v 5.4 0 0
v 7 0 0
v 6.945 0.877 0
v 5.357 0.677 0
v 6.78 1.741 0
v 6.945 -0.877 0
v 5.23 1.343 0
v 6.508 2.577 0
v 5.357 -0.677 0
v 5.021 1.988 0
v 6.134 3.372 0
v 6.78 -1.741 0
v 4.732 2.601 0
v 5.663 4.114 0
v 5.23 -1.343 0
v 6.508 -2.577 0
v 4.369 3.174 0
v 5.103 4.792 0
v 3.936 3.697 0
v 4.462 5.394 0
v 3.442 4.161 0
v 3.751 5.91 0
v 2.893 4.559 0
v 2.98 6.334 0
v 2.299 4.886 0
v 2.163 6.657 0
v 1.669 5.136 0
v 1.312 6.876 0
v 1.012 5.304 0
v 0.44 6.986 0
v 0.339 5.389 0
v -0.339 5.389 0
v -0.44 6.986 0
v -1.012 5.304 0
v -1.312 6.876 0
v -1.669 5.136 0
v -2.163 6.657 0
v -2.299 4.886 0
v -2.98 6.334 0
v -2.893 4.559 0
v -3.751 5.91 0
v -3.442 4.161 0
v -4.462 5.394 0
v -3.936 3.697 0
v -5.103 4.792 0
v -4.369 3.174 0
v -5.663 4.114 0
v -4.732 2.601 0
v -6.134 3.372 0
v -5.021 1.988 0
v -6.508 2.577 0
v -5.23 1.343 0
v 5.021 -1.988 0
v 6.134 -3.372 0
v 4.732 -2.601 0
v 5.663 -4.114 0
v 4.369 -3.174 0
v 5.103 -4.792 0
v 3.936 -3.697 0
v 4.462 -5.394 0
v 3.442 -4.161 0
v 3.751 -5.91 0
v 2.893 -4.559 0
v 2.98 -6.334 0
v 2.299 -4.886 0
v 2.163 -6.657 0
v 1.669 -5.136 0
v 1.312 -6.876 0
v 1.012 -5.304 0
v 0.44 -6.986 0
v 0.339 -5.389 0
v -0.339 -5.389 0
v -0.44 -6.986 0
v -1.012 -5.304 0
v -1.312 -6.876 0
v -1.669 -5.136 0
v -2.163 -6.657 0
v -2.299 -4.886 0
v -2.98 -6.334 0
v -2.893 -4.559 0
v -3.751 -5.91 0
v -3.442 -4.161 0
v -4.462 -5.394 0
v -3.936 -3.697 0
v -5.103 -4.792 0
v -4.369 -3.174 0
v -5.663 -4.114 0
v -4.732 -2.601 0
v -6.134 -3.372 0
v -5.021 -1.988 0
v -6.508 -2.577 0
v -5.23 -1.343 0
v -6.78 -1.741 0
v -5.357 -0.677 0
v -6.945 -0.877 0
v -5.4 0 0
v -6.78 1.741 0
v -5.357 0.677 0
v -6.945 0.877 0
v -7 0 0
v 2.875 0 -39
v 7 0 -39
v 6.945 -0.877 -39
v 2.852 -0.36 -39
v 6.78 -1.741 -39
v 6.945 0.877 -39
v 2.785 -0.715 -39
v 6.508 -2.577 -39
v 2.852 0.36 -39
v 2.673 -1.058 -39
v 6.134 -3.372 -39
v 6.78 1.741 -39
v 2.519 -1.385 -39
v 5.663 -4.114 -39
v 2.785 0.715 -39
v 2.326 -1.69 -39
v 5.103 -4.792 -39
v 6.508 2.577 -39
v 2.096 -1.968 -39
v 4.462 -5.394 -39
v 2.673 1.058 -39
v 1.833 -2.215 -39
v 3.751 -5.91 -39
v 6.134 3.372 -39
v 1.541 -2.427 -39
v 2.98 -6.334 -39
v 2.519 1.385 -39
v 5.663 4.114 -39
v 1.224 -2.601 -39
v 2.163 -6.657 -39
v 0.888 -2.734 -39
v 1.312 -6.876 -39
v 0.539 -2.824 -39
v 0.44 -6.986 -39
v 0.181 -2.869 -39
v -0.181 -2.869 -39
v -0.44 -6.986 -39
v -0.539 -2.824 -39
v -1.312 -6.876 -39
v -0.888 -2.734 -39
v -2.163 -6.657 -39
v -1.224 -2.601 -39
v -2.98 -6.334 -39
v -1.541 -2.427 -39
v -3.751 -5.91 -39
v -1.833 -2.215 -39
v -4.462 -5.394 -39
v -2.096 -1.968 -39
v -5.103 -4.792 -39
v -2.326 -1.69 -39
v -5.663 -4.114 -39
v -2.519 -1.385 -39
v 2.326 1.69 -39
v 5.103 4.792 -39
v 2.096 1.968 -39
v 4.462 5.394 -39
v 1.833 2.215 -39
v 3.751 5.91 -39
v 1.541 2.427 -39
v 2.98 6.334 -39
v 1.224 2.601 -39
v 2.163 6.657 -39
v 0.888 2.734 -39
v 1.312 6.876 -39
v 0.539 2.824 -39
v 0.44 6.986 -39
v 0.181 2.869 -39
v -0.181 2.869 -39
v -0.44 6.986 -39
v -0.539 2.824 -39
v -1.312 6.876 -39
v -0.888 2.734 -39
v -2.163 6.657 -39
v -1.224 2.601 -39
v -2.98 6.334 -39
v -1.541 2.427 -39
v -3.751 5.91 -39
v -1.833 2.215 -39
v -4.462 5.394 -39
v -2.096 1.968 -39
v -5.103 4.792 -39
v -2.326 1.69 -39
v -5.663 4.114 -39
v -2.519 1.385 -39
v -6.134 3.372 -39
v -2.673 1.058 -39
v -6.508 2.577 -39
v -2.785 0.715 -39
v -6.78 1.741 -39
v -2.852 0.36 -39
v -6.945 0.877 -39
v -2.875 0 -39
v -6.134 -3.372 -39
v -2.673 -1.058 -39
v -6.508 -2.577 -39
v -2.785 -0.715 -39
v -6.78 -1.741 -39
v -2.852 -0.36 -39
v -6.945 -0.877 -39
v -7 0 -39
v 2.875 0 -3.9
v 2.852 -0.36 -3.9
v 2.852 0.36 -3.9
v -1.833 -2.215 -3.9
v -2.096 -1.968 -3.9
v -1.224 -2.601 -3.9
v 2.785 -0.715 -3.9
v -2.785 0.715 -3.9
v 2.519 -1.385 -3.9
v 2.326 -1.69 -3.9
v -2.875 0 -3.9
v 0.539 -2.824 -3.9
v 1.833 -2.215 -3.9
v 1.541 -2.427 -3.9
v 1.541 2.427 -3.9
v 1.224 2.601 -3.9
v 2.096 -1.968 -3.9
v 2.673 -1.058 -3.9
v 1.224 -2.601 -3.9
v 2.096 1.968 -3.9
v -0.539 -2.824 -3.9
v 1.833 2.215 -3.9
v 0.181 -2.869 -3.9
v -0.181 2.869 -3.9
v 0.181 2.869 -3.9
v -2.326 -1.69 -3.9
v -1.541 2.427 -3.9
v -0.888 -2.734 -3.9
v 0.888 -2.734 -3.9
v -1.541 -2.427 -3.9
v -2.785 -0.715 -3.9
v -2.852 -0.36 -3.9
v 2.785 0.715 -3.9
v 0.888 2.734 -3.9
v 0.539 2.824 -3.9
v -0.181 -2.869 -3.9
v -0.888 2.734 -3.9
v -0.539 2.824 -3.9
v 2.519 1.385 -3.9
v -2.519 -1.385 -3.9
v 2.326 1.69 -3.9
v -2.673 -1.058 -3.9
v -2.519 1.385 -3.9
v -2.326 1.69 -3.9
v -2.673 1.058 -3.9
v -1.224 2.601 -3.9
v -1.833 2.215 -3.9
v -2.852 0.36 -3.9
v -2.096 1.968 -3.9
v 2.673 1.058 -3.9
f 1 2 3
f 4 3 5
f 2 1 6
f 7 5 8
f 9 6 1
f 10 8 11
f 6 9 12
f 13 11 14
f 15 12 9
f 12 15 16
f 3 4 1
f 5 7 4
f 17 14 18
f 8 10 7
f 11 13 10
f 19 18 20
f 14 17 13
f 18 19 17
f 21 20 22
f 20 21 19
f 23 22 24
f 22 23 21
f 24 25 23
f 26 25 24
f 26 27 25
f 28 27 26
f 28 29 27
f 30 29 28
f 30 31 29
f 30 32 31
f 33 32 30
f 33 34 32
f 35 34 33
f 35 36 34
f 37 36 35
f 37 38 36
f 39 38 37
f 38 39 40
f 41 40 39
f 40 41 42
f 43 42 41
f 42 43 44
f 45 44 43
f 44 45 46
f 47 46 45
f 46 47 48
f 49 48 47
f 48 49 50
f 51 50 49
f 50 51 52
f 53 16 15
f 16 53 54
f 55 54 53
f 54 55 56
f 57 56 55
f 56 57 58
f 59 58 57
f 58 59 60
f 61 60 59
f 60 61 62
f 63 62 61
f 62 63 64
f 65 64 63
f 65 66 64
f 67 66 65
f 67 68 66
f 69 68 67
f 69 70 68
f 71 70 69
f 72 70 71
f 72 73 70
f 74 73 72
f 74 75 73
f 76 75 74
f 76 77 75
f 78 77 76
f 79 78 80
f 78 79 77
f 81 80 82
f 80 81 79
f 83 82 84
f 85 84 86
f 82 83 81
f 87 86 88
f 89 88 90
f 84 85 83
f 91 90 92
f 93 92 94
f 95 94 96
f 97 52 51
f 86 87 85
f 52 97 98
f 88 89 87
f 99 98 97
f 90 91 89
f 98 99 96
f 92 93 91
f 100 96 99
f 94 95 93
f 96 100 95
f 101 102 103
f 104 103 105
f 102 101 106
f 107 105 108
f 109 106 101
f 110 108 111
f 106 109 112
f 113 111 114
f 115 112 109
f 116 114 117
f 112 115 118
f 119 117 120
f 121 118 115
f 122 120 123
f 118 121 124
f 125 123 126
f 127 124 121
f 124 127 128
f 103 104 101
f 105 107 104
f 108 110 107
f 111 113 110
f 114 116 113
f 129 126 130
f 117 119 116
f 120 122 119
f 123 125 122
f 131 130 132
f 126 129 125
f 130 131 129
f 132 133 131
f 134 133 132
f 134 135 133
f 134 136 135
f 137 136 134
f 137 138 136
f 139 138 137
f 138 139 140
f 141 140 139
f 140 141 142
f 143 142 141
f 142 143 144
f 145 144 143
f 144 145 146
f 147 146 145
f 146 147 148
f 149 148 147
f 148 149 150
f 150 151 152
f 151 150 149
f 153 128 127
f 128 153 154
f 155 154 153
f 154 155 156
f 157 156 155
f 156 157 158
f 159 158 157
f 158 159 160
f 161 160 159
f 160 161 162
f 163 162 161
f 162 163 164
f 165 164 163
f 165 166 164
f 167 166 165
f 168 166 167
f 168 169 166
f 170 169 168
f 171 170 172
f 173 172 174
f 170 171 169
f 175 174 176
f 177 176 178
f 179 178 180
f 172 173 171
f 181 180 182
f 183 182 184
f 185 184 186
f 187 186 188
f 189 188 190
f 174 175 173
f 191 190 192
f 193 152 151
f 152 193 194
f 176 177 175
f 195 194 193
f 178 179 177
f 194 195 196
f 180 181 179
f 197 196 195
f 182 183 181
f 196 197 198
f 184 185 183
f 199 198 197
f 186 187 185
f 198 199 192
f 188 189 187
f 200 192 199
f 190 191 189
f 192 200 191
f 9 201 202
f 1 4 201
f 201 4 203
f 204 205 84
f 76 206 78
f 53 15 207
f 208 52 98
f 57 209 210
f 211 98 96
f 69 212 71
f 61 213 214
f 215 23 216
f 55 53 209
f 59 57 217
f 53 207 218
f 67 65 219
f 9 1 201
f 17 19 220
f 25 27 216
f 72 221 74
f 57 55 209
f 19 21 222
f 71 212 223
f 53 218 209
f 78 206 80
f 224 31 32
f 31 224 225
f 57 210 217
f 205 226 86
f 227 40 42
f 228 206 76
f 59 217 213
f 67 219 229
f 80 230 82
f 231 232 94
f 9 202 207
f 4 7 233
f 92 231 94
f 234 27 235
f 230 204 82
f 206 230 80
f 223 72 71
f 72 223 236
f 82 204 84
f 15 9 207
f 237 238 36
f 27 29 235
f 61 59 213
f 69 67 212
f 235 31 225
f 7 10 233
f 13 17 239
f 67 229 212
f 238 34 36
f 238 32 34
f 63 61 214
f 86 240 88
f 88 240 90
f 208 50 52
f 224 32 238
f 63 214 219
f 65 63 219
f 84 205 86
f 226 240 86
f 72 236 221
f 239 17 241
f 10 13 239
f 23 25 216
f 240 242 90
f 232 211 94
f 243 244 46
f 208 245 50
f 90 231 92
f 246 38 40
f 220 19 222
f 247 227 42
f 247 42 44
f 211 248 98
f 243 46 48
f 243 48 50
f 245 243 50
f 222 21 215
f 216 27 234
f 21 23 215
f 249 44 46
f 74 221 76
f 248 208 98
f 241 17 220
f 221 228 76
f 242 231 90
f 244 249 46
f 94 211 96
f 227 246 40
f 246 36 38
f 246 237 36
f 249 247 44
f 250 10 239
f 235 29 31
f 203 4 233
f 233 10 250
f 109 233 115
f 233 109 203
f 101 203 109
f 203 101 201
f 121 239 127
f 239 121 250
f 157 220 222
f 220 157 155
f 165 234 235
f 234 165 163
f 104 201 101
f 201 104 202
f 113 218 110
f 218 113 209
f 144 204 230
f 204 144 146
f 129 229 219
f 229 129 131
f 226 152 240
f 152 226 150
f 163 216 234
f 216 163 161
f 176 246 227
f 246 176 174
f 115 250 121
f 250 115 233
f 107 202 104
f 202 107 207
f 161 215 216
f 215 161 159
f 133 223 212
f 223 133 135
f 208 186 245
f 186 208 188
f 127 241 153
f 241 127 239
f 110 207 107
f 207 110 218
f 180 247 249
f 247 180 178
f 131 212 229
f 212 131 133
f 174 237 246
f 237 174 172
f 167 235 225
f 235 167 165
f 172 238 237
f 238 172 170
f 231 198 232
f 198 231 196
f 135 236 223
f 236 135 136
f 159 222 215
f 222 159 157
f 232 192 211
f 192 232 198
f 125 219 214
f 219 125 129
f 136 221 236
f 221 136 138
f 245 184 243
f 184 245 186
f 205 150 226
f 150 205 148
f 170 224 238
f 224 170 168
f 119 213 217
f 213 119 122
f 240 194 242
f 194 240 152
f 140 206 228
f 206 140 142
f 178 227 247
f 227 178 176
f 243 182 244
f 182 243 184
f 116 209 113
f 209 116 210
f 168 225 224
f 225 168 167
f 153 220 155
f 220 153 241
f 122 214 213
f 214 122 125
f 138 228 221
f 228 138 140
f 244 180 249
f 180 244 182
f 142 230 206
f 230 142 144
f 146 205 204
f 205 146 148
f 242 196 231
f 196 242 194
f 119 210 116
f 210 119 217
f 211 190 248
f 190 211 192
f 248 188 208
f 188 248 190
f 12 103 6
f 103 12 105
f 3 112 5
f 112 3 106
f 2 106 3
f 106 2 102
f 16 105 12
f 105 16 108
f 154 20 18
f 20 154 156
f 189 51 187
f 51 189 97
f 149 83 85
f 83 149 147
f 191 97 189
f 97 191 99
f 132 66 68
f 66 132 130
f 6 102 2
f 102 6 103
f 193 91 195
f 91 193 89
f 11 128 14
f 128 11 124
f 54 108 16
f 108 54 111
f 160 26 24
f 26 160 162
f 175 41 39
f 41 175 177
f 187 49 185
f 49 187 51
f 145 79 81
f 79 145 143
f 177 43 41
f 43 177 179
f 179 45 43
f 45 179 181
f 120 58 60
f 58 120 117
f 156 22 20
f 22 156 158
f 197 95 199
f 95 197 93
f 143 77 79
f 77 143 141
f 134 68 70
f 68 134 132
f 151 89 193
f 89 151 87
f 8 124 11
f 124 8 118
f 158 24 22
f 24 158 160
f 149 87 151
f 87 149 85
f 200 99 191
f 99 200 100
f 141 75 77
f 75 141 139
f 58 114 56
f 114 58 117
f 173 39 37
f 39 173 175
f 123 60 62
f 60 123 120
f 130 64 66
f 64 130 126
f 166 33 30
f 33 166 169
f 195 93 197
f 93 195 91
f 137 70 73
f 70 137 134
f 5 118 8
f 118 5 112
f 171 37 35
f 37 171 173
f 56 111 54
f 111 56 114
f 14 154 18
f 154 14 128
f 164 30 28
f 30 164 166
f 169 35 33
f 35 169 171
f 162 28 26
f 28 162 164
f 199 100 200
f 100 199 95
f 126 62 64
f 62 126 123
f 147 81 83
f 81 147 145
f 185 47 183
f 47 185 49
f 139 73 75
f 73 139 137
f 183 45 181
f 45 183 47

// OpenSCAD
$fn = 50;


difference() {
	union() {
		translate(v = [0, 0, -39.0000000000]) {
			cylinder(h = 39, r = 7.0000000000);
		}
		cylinder(h = 0, r = 16.0000000000);
	}
	union() {
		translate(v = [0, 0, 0]) {
			rotate(a = [0, 0, 0]) {
				difference() {
					union() {
						#translate(v = [0, 0, -39.0000000000]) {
							cylinder(h = 39, r = 2.6000000000);
						}
						#translate(v = [0, 0, -3.9000000000]) {
							cylinder(h = 3.9000000000, r = 7.0000000000, r1 = 2.8750000000, r2 = 5.4000000000);
						}
						#translate(v = [0, 0, -39.0000000000]) {
							cylinder(h = 39, r = 2.8750000000);
						}
						#translate(v = [0, 0, -39.0000000000]) {
							cylinder(h = 39, r = 2.6000000000);
						}
					}
					union();
				}
			}
		}
	}
}
